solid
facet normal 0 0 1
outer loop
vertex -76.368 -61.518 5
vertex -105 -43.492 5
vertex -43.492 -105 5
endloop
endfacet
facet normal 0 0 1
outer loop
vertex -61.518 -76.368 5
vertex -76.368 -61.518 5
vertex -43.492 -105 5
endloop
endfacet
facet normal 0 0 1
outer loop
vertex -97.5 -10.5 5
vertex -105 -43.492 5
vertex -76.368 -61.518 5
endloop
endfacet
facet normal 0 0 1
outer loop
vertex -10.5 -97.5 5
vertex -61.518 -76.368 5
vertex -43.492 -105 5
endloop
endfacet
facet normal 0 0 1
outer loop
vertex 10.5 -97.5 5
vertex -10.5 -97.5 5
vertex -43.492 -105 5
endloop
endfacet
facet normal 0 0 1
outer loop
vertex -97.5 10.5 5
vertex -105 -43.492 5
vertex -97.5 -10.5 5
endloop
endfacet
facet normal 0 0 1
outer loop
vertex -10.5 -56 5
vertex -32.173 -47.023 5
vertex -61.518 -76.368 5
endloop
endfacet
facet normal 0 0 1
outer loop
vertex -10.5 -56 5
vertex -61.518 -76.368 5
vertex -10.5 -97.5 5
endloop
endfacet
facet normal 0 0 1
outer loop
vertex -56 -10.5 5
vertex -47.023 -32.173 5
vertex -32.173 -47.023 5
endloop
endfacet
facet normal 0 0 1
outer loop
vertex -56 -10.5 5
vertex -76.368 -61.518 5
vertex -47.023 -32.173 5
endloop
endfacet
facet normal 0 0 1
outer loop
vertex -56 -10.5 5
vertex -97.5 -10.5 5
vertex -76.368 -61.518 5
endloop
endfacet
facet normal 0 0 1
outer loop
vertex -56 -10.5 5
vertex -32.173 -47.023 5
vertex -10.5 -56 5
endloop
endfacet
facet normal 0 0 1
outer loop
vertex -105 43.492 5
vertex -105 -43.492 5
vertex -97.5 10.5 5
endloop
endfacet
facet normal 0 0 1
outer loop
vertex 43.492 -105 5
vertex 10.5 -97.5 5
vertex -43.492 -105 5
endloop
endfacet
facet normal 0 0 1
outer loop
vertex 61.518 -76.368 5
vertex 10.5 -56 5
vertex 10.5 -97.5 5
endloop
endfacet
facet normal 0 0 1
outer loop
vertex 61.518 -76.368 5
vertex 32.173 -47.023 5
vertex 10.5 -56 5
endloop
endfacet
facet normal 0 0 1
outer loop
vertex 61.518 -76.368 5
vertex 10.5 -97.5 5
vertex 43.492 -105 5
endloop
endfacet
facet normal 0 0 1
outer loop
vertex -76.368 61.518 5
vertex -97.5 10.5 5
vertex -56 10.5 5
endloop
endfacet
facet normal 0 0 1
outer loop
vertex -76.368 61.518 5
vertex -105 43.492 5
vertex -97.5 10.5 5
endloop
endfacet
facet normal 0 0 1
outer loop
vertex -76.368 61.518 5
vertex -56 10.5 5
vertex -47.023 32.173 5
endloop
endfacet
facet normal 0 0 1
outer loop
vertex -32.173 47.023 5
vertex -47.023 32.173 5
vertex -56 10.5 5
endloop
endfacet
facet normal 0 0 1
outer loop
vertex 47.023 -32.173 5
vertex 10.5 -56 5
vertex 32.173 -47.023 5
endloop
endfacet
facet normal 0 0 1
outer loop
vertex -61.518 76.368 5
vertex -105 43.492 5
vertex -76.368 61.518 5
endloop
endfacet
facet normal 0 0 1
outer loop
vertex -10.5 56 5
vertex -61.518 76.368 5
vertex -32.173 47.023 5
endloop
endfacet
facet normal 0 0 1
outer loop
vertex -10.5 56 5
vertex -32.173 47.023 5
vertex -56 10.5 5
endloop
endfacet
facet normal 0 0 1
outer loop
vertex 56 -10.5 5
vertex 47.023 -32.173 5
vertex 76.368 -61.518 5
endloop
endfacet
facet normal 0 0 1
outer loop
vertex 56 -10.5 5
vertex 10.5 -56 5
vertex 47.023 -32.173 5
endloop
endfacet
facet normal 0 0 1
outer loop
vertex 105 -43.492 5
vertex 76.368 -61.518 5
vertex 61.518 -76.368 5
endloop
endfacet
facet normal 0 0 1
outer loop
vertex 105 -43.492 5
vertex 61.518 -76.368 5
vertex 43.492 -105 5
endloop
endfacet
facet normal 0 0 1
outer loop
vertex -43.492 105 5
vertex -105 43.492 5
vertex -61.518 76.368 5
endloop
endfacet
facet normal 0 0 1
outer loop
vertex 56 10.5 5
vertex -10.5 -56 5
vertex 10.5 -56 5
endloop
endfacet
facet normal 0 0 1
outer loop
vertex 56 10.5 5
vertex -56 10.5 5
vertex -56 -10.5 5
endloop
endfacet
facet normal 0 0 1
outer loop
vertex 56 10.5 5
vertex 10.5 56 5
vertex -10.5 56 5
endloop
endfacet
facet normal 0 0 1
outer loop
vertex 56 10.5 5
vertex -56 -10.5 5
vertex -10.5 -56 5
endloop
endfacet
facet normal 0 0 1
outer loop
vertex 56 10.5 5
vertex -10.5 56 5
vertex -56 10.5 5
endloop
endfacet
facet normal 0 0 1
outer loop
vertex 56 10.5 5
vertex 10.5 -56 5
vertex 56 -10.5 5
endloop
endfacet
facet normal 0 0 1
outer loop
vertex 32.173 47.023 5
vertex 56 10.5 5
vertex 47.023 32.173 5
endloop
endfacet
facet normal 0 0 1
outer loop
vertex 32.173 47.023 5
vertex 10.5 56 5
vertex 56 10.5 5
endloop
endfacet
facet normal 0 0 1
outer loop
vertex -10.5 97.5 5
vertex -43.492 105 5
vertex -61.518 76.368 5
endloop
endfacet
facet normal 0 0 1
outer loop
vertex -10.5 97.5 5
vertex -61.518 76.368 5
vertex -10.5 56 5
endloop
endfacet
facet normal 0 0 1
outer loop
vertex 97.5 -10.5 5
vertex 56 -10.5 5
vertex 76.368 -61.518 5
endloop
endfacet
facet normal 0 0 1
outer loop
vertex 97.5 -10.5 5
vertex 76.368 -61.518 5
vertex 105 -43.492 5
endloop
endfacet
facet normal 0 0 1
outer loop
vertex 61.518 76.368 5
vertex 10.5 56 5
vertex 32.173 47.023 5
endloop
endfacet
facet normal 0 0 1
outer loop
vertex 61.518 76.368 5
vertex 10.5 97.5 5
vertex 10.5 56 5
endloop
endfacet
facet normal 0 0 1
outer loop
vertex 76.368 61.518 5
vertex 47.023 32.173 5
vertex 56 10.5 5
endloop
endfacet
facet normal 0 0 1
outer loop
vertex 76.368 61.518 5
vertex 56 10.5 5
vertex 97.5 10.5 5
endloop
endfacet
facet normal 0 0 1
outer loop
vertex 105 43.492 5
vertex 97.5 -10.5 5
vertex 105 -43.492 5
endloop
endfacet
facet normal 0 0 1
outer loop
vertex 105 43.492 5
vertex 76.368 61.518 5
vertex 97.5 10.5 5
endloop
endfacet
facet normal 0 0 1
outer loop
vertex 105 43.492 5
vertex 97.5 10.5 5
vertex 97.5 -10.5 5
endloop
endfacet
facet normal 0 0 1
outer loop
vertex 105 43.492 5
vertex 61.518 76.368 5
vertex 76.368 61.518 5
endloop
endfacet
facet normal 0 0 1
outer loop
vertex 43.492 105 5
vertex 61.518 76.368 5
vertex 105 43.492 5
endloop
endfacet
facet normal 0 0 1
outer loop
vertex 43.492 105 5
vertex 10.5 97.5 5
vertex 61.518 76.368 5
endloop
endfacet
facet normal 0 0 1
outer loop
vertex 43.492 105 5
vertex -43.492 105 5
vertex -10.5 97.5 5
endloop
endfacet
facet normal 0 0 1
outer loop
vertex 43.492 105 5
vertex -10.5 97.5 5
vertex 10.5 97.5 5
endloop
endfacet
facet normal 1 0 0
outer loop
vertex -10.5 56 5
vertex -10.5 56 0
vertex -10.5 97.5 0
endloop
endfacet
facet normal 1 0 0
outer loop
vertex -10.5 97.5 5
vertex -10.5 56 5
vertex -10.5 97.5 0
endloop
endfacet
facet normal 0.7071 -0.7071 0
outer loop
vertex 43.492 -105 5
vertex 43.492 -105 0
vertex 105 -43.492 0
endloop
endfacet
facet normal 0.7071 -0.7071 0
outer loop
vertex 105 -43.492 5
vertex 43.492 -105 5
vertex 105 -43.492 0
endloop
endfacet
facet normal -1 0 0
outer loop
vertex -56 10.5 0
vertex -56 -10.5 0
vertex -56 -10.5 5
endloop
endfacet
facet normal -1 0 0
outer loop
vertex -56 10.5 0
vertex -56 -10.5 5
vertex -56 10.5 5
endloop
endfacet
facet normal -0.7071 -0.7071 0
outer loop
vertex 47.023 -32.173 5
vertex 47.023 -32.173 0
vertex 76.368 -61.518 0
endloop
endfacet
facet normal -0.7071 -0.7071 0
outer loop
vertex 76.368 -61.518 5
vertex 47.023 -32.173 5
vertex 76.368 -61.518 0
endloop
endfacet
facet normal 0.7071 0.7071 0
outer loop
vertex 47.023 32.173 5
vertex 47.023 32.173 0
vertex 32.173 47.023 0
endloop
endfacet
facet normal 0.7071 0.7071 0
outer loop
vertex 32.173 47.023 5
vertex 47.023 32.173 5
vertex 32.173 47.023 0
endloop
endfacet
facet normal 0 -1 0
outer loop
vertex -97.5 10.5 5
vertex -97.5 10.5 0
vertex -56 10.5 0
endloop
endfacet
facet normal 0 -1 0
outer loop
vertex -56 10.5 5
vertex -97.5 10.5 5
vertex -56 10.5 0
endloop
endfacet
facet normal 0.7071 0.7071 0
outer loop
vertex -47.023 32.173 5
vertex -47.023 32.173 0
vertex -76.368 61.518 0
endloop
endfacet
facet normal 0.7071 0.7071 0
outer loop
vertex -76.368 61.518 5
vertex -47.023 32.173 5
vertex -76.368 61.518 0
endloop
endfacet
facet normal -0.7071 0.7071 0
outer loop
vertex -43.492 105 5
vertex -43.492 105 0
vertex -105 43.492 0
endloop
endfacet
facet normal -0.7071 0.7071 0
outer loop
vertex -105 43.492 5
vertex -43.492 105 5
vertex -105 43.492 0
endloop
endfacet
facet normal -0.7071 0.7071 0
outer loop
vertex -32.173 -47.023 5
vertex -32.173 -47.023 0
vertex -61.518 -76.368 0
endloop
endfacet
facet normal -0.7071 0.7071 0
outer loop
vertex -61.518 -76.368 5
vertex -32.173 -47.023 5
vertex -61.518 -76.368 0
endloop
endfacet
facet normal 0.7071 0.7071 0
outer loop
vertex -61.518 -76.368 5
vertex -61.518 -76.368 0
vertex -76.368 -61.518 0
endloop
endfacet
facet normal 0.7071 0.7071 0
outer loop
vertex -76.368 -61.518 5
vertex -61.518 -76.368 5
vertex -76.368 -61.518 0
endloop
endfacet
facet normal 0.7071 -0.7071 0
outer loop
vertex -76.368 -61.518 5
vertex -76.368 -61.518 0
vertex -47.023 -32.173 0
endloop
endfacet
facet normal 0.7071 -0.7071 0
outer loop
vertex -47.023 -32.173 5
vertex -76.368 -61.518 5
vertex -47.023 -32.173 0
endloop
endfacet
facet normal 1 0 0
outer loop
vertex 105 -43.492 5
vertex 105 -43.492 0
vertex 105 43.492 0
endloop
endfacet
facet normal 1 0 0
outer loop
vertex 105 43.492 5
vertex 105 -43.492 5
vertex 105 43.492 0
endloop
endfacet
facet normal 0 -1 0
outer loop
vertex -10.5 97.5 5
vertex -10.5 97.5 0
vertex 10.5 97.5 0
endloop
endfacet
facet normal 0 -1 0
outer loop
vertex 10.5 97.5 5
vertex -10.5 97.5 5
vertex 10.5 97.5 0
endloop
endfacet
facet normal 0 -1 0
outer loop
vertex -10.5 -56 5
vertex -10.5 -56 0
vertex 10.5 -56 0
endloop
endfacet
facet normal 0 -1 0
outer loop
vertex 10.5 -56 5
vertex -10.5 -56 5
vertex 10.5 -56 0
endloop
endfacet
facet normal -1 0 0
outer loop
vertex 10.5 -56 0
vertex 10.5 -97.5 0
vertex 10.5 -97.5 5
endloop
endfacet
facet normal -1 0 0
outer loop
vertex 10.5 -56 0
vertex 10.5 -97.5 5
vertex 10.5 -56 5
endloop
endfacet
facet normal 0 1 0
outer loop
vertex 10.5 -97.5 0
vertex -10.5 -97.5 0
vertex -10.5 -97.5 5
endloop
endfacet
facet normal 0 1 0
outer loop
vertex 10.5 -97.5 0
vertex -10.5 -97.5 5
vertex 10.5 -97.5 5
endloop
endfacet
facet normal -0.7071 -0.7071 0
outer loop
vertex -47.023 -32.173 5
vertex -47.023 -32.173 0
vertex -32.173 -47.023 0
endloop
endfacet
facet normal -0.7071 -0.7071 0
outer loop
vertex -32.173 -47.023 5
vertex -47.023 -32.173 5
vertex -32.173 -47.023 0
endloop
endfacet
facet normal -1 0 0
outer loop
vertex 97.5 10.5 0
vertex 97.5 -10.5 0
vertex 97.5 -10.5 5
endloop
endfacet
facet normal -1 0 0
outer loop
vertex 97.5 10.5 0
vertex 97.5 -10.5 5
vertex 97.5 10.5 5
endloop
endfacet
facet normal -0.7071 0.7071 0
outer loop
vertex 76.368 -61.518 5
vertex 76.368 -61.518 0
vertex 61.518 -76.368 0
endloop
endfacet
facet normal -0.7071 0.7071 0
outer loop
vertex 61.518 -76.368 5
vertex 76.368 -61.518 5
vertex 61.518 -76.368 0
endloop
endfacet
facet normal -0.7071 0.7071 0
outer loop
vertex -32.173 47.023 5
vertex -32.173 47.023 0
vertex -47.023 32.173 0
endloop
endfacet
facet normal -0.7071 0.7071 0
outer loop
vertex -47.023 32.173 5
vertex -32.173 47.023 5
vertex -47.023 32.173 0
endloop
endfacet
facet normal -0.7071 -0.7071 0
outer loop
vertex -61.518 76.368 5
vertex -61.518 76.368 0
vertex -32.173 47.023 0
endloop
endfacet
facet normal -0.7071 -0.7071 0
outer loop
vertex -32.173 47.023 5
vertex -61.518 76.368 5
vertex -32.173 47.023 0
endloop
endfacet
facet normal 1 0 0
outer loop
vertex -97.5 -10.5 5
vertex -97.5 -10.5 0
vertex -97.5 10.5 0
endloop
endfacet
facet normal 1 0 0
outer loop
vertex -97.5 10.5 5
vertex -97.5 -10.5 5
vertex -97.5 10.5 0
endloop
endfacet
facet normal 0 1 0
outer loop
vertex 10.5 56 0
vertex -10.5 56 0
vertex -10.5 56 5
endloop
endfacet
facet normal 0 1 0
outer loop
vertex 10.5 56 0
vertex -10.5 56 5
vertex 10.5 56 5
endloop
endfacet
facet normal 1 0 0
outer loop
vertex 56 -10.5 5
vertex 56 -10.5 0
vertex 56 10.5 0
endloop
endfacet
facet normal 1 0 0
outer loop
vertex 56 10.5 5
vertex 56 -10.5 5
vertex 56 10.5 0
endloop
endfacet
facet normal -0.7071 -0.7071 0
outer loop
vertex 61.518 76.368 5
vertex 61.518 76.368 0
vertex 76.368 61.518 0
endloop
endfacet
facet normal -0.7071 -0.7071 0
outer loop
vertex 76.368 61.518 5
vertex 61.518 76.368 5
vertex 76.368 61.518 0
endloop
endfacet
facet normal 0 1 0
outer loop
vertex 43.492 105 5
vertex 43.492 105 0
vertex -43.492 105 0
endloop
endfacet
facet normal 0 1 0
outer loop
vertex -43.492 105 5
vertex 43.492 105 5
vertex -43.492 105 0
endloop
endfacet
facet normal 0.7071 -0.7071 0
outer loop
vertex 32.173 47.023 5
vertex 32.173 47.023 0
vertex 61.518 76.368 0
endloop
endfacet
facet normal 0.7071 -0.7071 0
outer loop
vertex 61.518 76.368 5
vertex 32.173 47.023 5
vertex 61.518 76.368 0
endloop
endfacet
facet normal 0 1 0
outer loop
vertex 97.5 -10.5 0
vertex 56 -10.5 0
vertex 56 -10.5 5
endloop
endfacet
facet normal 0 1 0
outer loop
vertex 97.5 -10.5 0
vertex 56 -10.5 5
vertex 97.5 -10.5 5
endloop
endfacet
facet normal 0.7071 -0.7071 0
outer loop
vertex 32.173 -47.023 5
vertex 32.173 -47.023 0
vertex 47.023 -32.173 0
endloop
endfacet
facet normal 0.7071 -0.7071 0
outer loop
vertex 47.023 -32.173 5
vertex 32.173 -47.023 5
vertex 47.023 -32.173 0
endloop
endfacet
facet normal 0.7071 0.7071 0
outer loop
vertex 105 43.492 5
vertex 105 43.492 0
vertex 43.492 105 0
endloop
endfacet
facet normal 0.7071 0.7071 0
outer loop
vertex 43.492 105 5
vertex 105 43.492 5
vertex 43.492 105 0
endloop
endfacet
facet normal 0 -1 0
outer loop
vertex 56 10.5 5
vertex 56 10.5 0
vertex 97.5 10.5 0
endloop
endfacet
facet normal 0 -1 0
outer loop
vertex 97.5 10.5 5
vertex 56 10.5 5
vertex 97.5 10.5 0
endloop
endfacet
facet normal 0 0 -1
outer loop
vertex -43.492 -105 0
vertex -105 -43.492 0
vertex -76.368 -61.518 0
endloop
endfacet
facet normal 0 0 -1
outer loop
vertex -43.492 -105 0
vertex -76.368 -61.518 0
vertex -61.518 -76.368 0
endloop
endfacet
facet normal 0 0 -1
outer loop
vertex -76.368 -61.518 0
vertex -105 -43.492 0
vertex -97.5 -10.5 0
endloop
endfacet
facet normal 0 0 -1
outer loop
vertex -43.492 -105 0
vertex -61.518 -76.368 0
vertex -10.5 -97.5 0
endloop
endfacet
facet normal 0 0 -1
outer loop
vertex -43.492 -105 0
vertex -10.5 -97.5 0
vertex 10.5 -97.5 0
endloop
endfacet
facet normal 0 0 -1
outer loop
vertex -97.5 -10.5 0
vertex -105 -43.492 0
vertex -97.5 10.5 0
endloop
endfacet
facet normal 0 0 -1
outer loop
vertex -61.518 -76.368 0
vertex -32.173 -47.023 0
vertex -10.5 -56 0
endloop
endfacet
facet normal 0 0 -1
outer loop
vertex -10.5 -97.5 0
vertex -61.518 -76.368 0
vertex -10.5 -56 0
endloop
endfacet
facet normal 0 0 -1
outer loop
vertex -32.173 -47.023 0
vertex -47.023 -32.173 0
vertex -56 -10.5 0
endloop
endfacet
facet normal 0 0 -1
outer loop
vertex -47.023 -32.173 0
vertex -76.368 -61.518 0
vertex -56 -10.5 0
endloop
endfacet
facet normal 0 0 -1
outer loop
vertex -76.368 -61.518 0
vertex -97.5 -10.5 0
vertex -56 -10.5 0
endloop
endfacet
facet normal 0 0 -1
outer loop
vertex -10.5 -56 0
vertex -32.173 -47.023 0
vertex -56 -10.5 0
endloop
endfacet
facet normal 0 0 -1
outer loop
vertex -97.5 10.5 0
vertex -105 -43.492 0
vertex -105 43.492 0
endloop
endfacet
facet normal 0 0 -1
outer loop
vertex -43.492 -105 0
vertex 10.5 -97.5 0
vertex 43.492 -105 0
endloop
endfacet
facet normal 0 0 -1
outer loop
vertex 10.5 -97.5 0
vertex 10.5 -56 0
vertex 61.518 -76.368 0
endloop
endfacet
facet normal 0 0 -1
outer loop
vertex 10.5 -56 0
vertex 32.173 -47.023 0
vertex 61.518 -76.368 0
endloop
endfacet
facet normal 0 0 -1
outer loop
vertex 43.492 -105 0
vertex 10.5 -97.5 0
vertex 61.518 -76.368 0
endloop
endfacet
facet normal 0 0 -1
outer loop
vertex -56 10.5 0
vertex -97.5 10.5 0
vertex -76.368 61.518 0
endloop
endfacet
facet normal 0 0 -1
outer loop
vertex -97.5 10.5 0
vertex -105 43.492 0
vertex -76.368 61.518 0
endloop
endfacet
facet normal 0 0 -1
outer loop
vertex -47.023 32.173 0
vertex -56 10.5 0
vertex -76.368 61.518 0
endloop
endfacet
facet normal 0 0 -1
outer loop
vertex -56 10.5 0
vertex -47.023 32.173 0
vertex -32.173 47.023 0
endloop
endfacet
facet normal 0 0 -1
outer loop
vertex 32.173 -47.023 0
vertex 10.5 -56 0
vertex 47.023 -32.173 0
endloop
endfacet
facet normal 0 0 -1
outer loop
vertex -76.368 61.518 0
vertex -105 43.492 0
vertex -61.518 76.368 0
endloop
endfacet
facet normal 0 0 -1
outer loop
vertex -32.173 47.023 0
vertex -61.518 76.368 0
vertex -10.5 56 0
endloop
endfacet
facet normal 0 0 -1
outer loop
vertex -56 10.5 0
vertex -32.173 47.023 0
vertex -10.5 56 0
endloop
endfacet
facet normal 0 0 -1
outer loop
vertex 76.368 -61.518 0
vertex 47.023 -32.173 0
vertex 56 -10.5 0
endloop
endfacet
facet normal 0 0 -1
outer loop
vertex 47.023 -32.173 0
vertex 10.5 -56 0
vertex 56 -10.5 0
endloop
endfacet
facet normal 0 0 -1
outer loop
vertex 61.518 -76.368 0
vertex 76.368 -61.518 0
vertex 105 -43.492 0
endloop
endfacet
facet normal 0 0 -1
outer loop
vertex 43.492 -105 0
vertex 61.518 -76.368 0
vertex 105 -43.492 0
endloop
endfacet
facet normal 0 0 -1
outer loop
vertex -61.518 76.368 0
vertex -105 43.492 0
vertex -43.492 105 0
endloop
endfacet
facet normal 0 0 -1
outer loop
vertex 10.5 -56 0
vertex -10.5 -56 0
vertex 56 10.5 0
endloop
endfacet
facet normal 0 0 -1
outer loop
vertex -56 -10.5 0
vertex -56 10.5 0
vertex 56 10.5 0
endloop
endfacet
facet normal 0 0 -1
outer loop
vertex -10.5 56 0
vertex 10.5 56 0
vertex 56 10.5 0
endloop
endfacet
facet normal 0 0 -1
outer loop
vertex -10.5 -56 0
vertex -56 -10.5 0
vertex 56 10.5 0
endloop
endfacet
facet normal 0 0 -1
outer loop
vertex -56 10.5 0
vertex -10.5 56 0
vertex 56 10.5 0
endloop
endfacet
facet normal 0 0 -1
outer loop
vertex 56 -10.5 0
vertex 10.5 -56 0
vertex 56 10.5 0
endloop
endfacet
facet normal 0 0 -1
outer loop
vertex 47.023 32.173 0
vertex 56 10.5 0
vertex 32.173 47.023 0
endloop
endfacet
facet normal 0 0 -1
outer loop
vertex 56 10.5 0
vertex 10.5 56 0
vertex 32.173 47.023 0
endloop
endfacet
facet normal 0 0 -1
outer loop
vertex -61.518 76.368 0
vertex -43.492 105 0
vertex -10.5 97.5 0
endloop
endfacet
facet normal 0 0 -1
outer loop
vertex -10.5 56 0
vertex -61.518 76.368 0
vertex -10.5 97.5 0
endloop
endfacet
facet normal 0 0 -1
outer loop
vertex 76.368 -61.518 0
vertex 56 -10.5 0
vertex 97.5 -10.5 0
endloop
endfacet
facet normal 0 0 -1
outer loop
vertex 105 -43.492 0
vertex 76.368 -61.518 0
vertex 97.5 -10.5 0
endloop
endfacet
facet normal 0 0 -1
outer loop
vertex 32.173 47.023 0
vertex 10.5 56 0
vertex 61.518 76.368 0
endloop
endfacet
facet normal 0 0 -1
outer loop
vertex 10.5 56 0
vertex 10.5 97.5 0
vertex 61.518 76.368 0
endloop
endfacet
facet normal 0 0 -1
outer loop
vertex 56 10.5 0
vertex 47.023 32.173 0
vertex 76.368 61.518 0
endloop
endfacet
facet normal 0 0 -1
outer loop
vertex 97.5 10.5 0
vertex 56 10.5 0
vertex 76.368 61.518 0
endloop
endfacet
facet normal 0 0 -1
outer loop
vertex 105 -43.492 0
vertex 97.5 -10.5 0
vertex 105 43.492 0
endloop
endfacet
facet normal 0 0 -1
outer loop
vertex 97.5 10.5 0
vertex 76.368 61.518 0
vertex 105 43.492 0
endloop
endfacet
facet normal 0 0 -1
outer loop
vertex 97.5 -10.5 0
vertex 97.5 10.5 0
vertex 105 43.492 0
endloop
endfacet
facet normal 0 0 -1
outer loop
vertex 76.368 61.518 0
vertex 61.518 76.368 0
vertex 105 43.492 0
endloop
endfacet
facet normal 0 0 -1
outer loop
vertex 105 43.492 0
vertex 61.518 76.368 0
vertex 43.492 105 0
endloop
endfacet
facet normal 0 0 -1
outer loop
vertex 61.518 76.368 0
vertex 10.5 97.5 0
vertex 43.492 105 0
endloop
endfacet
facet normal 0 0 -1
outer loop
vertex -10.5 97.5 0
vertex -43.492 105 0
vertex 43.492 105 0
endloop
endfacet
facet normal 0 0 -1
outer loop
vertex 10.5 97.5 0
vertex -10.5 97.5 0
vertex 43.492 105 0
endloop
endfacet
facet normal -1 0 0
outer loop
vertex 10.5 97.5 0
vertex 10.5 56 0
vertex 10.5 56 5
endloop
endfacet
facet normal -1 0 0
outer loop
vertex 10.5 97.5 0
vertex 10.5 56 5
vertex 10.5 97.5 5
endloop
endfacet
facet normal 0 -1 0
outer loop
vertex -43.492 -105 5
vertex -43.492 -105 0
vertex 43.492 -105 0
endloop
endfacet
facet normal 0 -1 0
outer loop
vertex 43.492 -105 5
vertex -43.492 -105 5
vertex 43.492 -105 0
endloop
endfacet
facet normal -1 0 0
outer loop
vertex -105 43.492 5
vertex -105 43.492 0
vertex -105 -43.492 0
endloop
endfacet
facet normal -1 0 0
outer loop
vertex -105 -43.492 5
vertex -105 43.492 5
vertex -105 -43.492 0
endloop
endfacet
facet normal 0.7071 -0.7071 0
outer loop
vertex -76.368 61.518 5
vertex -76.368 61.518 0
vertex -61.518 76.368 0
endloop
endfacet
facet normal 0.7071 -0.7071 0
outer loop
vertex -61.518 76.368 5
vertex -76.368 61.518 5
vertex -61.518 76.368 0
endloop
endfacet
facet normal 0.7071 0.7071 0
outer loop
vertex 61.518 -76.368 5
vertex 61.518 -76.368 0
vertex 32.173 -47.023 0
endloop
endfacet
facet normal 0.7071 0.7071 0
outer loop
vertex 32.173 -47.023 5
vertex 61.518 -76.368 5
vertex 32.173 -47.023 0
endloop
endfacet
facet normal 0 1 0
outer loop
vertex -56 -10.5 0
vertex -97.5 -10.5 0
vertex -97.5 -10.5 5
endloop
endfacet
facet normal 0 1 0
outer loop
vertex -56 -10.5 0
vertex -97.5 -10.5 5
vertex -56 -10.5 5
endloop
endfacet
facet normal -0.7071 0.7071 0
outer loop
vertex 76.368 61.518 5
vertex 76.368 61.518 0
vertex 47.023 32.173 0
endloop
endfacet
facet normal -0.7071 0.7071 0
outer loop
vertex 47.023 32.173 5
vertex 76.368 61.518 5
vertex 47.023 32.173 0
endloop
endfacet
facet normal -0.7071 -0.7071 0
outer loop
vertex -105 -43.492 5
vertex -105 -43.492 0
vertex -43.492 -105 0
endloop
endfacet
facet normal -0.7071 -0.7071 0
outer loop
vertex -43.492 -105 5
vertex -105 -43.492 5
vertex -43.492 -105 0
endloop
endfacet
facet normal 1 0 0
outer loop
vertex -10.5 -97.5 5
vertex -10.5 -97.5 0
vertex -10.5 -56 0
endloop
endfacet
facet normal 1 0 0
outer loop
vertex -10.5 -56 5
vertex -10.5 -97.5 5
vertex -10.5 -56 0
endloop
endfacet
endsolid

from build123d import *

# Parameters (mm, degrees)
SKETCH1_W           = 41.5
SKETCH1_H           = 21
SKETCH1_W_2         = 21
SKETCH1_H_2         = 41.5
BOSS_EXTRUDE1_DEPTH = 5


with BuildPart() as part:
    # Sketch1 → Boss-Extrude1 (new body)
    with BuildSketch(Plane.XY):
        Polygon((105, 43.492424049), (43.492424049, 105), (-43.492424049, 105), (-105, 43.492424049), (-105, -43.492424049), (-43.492424049, -105), (43.492424049, -105), (105, -43.492424049), align=None)
        Polygon((47.022600949, -32.173358544), (76.367532368, -61.518289963), (61.518289963, -76.367532368), (32.173358544, -47.022600949), align=None, mode=Mode.SUBTRACT)
        with Locations((76.75, 0)):
            Rectangle(SKETCH1_W, SKETCH1_H, mode=Mode.SUBTRACT)
        with Locations((0, -76.75)):
            Rectangle(SKETCH1_W_2, SKETCH1_H_2, mode=Mode.SUBTRACT)
        Polygon((-32.173358544, -47.022600949), (-61.518289963, -76.367532368), (-76.367532368, -61.518289963), (-47.022600949, -32.173358544), align=None, mode=Mode.SUBTRACT)
        with Locations((-76.75, 0)):
            Rectangle(SKETCH1_W, SKETCH1_H, mode=Mode.SUBTRACT)
        Polygon((-47.022600949, 32.173358544), (-76.367532368, 61.518289963), (-61.518289963, 76.367532368), (-32.173358544, 47.022600949), align=None, mode=Mode.SUBTRACT)
        with Locations((0, 76.75)):
            Rectangle(SKETCH1_W_2, SKETCH1_H_2, mode=Mode.SUBTRACT)
        Polygon((32.173358544, 47.022600949), (61.518289963, 76.367532368), (76.367532368, 61.518289963), (47.022600949, 32.173358544), align=None, mode=Mode.SUBTRACT)
    extrude(amount=BOSS_EXTRUDE1_DEPTH)


solid = part.part
